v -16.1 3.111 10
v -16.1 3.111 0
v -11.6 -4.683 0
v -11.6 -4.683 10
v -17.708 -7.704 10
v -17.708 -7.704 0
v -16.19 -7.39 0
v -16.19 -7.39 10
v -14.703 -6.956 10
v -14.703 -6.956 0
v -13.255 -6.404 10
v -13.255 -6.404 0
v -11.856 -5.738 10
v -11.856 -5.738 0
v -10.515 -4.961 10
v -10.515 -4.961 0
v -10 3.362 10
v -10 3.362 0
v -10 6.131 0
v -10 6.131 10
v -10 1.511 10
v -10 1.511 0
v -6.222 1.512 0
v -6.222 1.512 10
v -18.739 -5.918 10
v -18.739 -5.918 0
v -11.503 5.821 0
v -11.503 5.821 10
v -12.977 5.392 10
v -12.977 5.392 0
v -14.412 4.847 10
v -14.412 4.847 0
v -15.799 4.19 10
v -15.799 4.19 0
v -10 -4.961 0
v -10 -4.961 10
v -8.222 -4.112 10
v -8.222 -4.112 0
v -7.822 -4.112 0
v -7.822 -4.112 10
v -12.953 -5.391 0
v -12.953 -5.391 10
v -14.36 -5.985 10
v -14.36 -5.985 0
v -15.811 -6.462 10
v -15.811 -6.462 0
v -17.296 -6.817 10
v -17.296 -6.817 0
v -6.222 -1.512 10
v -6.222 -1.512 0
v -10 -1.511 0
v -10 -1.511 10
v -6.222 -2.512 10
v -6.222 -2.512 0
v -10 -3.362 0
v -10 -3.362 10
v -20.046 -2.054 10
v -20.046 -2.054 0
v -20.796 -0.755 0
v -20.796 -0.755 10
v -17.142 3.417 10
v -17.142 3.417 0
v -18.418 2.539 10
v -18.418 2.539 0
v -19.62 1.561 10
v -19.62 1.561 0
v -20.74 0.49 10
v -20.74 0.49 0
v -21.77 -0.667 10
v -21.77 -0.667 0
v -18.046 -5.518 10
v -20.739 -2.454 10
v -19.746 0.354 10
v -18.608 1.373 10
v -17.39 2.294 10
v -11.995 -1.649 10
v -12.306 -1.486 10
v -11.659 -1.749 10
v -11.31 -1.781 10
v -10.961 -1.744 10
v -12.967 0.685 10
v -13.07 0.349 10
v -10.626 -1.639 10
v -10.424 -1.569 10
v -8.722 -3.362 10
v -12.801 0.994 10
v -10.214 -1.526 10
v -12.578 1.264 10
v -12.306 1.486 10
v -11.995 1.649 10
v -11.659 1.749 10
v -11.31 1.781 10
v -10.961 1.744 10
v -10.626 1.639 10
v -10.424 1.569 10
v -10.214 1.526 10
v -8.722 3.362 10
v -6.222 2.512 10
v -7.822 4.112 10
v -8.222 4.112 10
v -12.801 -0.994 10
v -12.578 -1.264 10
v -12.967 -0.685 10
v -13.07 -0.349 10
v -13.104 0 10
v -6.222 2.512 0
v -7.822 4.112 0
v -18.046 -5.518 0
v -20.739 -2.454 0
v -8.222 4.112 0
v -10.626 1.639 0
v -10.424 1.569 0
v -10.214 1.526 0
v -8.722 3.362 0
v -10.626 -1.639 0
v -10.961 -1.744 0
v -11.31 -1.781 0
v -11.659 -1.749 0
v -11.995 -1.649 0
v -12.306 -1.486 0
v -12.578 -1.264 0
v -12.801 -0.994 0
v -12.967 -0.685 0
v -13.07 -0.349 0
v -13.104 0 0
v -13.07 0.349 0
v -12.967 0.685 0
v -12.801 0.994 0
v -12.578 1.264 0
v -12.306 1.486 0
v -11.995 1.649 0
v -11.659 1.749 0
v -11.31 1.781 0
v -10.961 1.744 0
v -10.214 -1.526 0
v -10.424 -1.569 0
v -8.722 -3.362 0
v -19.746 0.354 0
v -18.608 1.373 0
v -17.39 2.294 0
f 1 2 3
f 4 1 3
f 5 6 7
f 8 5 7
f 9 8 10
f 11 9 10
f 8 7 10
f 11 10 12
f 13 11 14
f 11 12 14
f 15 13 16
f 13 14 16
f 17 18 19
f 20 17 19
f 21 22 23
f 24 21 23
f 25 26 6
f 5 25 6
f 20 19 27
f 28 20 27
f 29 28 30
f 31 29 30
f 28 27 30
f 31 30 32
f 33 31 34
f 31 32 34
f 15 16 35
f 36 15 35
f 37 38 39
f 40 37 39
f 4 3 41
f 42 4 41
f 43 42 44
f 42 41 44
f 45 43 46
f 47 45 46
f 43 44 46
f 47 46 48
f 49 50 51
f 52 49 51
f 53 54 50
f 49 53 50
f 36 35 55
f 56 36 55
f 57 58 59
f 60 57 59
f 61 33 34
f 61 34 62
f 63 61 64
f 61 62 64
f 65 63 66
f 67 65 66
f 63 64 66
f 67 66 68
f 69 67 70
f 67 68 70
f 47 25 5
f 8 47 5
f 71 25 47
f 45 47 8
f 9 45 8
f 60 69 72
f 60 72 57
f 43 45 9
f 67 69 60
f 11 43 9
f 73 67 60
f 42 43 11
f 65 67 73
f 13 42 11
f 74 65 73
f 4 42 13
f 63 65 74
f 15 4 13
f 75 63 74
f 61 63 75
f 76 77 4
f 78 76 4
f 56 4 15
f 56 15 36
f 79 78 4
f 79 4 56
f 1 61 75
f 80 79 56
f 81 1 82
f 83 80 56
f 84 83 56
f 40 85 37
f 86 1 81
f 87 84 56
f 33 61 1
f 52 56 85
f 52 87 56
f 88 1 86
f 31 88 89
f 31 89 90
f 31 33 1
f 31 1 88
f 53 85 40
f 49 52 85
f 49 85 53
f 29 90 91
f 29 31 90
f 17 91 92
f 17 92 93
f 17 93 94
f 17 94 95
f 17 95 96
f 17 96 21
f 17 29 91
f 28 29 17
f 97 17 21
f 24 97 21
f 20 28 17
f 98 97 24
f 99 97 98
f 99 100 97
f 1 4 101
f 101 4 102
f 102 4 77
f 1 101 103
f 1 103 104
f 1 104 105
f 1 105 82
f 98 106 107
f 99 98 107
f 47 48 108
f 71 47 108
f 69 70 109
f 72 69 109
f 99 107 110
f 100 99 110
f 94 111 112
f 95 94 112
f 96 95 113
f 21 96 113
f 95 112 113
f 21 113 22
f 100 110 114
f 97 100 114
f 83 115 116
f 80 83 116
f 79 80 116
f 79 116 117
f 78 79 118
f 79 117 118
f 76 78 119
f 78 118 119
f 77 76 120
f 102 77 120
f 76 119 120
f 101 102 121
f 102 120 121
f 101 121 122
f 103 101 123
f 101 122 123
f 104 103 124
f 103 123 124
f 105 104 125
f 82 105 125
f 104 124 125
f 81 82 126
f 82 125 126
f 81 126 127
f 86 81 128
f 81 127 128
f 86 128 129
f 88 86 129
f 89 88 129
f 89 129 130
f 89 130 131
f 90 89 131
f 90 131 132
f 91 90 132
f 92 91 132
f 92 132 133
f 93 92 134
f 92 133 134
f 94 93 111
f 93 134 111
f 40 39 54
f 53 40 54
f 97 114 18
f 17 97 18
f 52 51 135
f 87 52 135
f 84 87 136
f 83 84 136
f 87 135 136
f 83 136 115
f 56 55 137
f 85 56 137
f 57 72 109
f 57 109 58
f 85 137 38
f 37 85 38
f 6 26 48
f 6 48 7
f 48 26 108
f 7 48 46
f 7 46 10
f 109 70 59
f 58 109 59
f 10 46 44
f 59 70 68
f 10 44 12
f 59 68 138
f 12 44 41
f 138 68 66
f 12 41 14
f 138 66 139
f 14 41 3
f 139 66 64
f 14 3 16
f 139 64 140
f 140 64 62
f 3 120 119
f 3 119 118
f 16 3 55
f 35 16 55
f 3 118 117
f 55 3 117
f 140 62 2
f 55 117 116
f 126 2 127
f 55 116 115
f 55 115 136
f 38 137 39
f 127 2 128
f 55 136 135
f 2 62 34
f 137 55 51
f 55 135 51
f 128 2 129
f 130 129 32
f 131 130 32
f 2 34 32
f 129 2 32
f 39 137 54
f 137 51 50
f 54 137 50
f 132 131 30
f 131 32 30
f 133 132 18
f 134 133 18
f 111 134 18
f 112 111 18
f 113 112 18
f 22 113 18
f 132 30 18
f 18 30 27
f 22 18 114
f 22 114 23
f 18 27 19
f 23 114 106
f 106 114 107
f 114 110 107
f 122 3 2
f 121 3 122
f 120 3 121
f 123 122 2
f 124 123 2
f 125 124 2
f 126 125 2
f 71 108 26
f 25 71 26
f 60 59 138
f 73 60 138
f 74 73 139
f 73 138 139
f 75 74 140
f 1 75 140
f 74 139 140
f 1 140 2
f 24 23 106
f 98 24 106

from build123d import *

# Parameters (mm, degrees)
F2_DEPTH = 10


# Not quite as in the source:
# - a feature names something its author has since deleted; it is built from what else it names


with BuildPart() as f2:
    # F1 (on Top) → F2 (new body)
    with BuildSketch(Plane.XY):
        with BuildLine():
            ThreePointArc((-20.7961524227, -0.7545254038), (-18.6080572337, 1.3728200267), (-16.1, 3.1115))
            Line((-16.1, 3.1115), (-11.6, -4.6827286341))
            ThreePointArc((-11.6, -4.6827286341), (-14.3597696428, -5.9854299259), (-17.2961524227, -6.8167032303))
            Line((-17.2961524227, -6.8167032303), (-18.0461524227, -5.5176651246))
            Line((-18.0461524227, -5.5176651246), (-18.7389727457, -5.9176651246))
            Line((-18.7389727457, -5.9176651246), (-17.7077768116, -7.703748875))
            ThreePointArc((-17.7077768116, -7.703748875), (-13.9735101965, -6.69466899), (-10.5154733964, -4.9611838136))
            Line((-10.5154733964, -4.9611838136), (-10, -4.9611838136))
            Line((-10, -4.9611838136), (-10, -3.3615))
            Line((-10, -3.3615), (-8.722, -3.3615))
            Line((-8.722, -3.3615), (-8.222, -4.1115))
            Line((-8.222, -4.1115), (-7.822, -4.1115))
            Line((-7.822, -4.1115), (-6.222, -2.5115))
            Line((-6.222, -2.5115), (-6.222, -1.5115))
            Line((-6.222, -1.5115), (-10, -1.5115))
            ThreePointArc((-10, -1.5115), (-10.319496099, -1.5437237906), (-10.6261229788, -1.6390971966))
            ThreePointArc((-10.6261229788, -1.6390971966), (-13.1042708913, 0), (-10.6261229788, 1.6390971966))
            ThreePointArc((-10.6261229788, 1.6390971966), (-10.319496099, 1.5437237906), (-10, 1.5115))
            Line((-10, 1.5115), (-6.222, 1.5115))
            Line((-6.222, 1.5115), (-6.222, 2.5115))
            Line((-6.222, 2.5115), (-7.822, 4.1115))
            Line((-7.822, 4.1115), (-8.222, 4.1115))
            Line((-8.222, 4.1115), (-8.722, 3.3615))
            Line((-8.722, 3.3615), (-10, 3.3615))
            Line((-10, 3.3615), (-10, 4.1899551795))
            Line((-10, 4.1899551795), (-10, 6.131235349))
            ThreePointArc((-10, 6.131235349), (-12.9768183038, 5.3917266036), (-15.7988859575, 4.1899551795))
            ThreePointArc((-15.7988859575, 4.1899551795), (-19.0291465574, 2.0619500516), (-21.7701686798, -0.6674797591))
            Line((-21.7701686798, -0.6674797591), (-20.7389727457, -2.4535635095))
            Line((-20.7389727457, -2.4535635095), (-20.0461524227, -2.0535635095))
            Line((-20.0461524227, -2.0535635095), (-20.7961524227, -0.7545254038))
        make_face()
    extrude(amount=F2_DEPTH)


solid = f2.part
